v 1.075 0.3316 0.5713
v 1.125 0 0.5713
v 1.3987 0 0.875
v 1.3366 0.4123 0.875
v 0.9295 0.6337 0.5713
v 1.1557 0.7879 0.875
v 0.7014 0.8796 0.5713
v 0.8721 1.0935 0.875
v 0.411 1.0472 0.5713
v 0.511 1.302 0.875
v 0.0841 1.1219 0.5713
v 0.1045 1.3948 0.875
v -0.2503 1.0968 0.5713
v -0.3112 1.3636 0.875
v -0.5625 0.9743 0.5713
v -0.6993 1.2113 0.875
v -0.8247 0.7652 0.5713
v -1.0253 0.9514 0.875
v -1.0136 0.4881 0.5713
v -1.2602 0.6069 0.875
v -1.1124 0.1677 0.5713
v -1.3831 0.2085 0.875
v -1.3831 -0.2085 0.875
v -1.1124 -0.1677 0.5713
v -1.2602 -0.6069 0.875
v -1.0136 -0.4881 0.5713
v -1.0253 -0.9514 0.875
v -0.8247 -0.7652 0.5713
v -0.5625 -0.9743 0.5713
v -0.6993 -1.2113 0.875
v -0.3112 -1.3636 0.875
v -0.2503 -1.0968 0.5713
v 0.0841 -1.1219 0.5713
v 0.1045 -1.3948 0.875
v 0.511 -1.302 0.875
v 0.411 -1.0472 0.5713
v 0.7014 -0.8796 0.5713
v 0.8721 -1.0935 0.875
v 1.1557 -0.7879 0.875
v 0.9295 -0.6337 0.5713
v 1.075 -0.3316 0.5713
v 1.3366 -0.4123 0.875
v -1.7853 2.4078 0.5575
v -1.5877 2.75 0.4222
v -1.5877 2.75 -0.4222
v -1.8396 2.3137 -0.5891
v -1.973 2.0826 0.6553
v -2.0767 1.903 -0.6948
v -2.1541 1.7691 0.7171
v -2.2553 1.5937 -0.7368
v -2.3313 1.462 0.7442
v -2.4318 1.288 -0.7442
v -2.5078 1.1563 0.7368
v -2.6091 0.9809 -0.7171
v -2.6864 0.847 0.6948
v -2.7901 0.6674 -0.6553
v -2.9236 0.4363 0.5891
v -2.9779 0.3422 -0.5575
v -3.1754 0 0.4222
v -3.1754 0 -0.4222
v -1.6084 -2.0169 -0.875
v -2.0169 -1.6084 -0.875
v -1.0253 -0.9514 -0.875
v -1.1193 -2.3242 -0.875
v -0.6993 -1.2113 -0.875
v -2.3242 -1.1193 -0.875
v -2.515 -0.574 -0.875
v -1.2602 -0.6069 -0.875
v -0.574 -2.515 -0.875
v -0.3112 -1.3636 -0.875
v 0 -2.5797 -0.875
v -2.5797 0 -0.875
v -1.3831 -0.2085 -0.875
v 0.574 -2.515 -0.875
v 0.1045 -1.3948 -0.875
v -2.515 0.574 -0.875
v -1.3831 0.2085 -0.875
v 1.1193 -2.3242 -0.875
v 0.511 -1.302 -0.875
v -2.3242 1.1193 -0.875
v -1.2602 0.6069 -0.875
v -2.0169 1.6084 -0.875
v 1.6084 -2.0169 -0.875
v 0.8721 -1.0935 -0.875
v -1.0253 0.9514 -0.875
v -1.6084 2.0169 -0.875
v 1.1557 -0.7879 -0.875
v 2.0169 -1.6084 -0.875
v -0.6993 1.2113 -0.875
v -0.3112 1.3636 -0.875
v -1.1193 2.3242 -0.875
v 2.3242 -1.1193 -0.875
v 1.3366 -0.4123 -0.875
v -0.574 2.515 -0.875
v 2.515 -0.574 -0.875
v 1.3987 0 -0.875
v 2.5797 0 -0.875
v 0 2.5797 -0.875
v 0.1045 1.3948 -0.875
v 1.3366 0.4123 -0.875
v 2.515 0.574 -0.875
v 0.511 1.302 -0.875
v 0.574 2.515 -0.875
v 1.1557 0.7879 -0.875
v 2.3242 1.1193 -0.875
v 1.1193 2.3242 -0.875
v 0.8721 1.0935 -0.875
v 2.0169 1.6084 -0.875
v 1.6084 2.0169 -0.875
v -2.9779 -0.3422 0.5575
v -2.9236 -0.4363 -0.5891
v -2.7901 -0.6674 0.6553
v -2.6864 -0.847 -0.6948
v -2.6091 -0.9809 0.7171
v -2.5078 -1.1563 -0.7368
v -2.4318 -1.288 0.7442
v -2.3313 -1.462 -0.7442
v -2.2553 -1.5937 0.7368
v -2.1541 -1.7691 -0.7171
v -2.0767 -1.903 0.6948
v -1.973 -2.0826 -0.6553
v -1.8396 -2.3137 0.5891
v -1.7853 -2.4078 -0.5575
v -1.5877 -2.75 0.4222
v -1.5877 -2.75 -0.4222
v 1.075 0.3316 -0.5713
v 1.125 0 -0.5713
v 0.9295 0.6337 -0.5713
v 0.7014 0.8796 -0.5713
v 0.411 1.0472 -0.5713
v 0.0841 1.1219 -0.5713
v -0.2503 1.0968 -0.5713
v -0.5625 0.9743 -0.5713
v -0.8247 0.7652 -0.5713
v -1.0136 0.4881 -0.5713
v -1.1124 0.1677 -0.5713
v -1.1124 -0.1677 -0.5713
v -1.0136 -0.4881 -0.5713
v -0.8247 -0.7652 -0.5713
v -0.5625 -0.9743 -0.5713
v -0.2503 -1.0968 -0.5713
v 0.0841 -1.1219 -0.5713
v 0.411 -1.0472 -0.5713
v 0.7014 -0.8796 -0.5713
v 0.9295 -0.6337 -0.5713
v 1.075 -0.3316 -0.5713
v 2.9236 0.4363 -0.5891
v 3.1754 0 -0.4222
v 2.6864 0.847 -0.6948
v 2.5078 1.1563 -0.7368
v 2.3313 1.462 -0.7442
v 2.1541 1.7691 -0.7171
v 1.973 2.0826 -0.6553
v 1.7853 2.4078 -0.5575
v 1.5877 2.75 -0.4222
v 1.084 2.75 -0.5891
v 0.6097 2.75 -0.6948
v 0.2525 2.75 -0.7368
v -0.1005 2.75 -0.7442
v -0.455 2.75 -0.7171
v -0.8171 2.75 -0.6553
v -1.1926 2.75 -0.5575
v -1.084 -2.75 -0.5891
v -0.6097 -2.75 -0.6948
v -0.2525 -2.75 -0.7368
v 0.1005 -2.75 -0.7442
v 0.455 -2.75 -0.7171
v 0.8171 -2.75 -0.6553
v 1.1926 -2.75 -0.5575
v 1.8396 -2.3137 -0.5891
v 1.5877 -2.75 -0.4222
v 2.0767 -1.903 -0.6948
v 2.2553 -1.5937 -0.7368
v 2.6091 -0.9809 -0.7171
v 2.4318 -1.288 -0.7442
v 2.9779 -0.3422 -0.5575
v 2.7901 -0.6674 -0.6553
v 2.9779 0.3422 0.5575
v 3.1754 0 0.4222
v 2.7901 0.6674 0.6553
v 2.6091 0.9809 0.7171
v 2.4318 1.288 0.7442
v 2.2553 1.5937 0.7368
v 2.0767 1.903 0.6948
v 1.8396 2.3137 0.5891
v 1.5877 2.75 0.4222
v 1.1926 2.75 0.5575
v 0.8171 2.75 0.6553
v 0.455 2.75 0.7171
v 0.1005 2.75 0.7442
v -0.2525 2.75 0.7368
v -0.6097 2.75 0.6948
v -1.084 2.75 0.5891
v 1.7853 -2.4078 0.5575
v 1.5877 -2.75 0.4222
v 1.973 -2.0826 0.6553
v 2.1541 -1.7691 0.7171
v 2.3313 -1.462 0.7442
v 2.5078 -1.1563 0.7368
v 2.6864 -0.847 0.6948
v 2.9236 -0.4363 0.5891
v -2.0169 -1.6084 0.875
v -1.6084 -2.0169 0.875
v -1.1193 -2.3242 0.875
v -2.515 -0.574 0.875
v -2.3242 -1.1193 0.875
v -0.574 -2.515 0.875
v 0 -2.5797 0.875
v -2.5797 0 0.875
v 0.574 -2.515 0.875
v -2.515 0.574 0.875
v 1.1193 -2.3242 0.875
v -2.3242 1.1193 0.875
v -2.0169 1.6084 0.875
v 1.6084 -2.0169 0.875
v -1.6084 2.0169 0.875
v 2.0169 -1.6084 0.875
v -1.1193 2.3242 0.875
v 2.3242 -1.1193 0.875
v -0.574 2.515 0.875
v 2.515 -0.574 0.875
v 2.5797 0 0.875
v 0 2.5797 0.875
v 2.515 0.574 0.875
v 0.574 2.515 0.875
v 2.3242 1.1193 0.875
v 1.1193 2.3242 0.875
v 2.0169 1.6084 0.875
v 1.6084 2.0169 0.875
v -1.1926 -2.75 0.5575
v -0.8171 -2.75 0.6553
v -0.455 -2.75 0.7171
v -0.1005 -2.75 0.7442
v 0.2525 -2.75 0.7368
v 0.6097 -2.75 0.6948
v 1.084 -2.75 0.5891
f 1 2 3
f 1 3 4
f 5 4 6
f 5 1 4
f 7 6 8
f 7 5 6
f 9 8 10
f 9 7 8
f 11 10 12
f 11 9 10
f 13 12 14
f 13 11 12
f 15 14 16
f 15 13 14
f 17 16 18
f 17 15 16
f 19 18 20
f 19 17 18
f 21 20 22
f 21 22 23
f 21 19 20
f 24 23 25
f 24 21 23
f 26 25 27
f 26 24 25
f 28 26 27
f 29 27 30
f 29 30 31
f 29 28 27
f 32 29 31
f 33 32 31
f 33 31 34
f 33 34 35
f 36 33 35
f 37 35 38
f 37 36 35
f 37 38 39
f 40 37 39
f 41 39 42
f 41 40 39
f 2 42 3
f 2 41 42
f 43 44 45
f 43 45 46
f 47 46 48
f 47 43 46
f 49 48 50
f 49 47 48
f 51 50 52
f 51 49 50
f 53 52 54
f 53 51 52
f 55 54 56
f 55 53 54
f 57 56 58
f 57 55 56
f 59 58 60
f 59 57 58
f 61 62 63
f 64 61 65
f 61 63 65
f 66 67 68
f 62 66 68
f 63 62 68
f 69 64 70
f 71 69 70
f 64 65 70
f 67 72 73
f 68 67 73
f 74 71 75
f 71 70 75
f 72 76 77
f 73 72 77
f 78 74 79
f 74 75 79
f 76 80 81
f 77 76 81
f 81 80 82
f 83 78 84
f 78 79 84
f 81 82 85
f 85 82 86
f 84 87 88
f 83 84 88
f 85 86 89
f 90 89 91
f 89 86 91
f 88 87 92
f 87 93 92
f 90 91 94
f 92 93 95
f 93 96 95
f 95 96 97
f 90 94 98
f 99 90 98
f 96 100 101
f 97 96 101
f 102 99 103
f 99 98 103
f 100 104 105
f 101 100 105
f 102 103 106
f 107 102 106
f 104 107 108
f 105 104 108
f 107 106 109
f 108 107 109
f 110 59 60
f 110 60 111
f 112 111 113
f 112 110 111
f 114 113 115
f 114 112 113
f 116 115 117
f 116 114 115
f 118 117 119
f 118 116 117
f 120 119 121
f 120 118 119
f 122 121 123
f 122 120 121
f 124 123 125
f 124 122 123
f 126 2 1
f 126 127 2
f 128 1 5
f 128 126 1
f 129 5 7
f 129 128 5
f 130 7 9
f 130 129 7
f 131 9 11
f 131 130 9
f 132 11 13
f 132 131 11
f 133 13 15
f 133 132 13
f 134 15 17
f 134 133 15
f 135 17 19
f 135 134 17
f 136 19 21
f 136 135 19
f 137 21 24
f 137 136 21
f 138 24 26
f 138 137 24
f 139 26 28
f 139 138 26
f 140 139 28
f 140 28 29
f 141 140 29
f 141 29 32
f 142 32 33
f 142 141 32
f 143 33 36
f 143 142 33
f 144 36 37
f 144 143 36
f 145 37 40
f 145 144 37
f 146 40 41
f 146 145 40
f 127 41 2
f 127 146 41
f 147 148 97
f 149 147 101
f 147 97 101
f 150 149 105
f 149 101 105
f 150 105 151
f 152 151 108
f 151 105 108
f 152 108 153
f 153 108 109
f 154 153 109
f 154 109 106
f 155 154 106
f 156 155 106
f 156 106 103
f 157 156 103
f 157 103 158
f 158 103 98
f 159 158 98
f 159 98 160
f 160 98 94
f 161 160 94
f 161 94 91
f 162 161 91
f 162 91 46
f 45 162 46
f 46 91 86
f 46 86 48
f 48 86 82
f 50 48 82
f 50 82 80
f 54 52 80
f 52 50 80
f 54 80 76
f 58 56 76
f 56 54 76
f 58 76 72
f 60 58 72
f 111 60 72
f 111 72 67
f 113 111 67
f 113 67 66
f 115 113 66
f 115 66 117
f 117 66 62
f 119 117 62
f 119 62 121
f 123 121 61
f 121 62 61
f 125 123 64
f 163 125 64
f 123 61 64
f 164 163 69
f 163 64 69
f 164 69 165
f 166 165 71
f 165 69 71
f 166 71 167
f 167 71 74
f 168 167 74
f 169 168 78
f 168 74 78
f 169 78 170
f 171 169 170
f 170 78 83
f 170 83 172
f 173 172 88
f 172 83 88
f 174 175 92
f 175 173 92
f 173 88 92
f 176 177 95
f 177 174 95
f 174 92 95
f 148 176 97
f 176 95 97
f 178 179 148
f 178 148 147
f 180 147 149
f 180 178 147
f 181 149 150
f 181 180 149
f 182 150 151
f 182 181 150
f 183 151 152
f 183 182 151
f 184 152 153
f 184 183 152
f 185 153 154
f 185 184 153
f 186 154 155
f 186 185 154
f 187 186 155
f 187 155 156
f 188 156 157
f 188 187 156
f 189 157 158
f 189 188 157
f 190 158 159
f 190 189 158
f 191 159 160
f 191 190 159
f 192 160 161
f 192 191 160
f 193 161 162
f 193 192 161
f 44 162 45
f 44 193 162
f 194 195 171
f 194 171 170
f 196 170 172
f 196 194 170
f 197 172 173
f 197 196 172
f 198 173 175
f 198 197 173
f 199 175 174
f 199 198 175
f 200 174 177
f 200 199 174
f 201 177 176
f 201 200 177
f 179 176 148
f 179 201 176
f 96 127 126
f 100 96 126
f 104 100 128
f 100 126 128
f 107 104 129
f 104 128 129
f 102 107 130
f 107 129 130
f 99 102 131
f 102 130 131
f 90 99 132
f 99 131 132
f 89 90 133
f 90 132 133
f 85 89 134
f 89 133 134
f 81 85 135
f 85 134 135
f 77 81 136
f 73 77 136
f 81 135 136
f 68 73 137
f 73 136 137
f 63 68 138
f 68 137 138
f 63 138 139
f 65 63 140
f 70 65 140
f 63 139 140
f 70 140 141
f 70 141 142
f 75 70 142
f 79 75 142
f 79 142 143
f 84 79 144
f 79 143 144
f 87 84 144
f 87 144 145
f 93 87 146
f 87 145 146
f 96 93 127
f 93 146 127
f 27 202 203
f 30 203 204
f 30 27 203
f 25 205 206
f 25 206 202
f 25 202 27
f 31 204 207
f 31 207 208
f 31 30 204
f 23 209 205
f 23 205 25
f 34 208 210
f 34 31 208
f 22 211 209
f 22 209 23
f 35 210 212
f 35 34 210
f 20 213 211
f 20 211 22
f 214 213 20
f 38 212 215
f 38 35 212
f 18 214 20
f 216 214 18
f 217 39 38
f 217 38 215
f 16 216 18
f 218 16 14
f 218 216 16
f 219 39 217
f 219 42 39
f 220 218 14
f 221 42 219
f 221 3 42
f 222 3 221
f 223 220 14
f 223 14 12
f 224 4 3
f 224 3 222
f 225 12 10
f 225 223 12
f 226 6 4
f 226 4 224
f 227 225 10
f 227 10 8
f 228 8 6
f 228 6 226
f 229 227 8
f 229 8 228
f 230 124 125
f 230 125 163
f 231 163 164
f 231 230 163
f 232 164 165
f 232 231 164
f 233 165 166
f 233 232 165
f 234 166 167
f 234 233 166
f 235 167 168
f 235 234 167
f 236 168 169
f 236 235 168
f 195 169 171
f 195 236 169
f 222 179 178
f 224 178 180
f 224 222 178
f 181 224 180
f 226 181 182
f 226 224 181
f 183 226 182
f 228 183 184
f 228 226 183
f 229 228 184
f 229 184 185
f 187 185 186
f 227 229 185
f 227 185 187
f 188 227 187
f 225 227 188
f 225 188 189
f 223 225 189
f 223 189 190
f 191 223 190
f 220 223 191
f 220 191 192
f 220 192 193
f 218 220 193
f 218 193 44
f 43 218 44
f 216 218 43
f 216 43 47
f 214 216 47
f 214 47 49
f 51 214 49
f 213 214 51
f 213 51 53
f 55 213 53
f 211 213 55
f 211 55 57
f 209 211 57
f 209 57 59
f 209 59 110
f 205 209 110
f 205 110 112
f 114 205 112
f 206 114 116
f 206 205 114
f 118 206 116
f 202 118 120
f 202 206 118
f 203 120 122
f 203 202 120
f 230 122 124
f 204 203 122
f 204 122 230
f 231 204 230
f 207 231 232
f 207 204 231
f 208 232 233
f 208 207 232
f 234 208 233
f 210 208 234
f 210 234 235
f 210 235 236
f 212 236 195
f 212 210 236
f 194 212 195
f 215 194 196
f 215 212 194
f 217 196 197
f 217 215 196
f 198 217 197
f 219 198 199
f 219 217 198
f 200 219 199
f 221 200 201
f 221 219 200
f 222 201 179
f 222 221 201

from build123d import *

# Parameters (mm, degrees)
SKETCH1_R      = 1.125
EXTRUDE1_DEPTH = 0.875


with BuildPart() as part:
    # Sketch1 → Extrude1 (new body, symmetric)
    with BuildSketch(Plane.XY):
        Polygon((3.175426481, 0), (1.58771324, 2.75), (-1.58771324, 2.75), (-3.175426481, 0), (-1.58771324, -2.75), (1.58771324, -2.75), align=None)
        Circle(SKETCH1_R, mode=Mode.SUBTRACT)
    extrude(amount=EXTRUDE1_DEPTH, both=True)

    # Sketch2 → Cut-Revolve1 (revolve, cut)
    with BuildSketch(Plane(origin=(0, 0, 0), x_dir=(1, 0, 0), z_dir=(0, 1, 0))):
        Polygon((3.175426481, 0.875), (3.175426481, 0.422248701), (2.579675658, 0.875), align=None)
        Polygon((3.175426481, -0.875), (3.175426481, -0.422248701), (2.579675658, -0.875), align=None)
        Polygon((1.042426481, 0.875), (1.398698822, 0.875), (1.042426481, 0.47968772), align=None)
        Polygon((1.042426481, -0.875), (1.398698822, -0.875), (1.042426481, -0.47968772), align=None)
    revolve(axis=Axis((0, 0, -0.875), (0, 0, 1)), mode=Mode.SUBTRACT)


solid = part.part
